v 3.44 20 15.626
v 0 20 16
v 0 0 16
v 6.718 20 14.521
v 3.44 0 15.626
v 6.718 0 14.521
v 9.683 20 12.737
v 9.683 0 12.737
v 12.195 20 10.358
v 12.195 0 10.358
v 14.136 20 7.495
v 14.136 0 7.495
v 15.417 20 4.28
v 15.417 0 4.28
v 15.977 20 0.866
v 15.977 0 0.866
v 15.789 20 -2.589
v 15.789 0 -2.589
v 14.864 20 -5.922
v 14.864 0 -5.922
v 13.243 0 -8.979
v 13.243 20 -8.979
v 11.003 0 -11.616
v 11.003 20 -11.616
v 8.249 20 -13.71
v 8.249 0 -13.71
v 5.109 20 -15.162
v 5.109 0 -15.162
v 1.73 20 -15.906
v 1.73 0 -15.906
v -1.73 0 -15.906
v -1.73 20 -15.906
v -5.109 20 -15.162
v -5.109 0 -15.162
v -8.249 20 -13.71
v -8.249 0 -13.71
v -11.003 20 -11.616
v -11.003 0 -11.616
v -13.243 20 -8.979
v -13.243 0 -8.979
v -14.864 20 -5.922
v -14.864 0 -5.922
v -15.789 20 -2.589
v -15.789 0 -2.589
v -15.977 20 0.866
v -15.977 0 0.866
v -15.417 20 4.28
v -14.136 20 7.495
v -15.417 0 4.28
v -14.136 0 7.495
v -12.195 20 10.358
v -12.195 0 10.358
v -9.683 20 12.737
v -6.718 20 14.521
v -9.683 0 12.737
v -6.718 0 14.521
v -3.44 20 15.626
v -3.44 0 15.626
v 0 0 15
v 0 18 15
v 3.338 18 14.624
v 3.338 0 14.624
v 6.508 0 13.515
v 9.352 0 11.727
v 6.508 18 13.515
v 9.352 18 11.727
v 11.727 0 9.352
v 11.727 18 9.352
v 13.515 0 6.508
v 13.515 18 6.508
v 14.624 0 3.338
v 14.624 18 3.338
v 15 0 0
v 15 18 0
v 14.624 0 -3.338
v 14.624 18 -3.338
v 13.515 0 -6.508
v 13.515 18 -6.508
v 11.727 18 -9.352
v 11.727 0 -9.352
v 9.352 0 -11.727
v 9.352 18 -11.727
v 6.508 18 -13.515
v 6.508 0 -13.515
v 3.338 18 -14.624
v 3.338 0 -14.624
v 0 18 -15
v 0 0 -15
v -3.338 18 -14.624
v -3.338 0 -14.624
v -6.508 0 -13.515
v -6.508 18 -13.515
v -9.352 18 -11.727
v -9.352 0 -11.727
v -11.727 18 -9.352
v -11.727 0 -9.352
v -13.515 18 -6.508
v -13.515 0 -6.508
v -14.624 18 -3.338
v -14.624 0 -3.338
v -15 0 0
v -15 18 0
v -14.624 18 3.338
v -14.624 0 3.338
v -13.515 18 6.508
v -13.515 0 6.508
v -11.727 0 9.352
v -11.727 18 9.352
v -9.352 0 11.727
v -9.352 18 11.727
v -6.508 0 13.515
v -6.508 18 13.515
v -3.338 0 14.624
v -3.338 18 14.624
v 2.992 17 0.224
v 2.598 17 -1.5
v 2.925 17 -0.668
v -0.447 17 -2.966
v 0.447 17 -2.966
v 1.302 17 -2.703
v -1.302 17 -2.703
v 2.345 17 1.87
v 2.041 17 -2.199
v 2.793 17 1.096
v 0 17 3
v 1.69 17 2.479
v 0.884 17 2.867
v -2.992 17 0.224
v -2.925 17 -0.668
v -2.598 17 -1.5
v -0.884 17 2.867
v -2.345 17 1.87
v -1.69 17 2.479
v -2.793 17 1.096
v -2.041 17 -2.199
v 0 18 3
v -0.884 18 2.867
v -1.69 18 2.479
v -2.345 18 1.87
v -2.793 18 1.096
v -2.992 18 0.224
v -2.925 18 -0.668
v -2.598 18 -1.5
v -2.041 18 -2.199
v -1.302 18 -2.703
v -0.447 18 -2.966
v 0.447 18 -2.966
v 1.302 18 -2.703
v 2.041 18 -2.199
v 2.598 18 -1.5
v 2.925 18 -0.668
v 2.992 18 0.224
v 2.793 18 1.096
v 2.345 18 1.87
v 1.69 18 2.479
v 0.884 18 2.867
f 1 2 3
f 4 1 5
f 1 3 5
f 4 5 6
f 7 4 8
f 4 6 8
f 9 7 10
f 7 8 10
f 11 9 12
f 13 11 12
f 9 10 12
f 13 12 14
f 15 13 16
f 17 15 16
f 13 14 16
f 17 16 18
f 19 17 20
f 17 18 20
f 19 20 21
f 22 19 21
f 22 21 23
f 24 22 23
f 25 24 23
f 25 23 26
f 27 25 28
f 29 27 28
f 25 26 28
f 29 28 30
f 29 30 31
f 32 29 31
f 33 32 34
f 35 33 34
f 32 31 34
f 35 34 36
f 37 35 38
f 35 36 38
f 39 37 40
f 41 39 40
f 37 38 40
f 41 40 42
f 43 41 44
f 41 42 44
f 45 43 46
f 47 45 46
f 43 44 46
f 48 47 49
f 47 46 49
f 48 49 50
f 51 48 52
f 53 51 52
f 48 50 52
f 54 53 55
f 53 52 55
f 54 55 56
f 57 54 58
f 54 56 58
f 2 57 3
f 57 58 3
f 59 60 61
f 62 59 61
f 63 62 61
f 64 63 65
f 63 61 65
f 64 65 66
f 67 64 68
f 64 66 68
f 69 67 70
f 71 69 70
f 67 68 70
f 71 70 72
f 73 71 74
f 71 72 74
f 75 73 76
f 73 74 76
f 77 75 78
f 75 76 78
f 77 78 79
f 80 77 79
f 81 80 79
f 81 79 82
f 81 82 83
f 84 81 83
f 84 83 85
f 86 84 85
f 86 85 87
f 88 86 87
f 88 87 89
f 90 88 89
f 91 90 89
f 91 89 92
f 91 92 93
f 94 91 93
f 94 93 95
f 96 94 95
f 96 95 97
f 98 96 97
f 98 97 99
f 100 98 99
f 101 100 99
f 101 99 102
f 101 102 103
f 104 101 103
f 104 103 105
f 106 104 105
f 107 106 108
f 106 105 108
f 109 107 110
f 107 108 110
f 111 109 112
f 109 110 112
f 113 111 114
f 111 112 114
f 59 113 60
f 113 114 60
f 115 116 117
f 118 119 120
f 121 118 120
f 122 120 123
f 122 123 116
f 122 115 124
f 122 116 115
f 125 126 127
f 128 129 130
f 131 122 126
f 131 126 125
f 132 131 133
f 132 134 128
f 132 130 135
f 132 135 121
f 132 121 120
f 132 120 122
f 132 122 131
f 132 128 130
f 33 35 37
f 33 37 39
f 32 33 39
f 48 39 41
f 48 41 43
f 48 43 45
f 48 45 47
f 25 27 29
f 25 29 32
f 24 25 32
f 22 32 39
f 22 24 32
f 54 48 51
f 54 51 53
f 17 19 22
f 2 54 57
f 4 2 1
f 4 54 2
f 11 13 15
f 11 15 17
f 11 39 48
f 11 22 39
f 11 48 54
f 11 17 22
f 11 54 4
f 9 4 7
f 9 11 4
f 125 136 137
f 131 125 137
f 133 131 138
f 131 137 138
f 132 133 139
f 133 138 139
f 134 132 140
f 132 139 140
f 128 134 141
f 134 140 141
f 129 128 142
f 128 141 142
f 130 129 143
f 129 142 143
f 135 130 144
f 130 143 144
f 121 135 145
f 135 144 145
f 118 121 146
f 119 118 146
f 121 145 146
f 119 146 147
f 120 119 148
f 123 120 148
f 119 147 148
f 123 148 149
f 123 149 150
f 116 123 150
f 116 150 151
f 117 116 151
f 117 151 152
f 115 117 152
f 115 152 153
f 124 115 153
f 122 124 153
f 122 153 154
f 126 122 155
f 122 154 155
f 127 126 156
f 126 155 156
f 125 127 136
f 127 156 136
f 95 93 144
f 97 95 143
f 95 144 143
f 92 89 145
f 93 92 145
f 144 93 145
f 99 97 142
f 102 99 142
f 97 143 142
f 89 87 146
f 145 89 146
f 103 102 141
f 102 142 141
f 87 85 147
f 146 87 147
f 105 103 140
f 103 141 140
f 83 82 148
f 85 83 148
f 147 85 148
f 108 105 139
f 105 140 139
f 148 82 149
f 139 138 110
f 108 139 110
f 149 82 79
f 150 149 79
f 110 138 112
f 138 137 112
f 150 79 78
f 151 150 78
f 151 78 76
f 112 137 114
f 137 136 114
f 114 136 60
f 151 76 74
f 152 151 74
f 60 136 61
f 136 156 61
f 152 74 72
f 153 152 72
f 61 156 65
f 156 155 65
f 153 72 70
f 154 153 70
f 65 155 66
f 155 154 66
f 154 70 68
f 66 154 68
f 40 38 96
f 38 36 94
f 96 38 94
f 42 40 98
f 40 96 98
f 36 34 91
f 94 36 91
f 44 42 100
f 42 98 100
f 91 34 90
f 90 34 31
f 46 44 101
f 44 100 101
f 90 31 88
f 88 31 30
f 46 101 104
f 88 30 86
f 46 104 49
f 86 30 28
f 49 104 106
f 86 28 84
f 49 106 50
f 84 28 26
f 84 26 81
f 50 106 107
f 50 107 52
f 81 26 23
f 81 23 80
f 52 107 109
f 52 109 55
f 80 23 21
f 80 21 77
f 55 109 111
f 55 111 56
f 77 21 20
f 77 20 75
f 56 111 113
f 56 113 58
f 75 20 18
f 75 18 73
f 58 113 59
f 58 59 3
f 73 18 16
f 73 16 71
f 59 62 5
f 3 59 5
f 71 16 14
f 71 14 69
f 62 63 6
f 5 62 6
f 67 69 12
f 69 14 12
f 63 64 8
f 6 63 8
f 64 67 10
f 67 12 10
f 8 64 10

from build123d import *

# Parameters (mm, degrees)
SKETCH2_R           = 16
BOSS_EXTRUDE1_DEPTH = 20
CUT_EXTRUDE1_START  = -2
SKETCH3_R           = 15
CUT_EXTRUDE1_DEPTH  = 29.199337741
SKETCH4_R           = 3
BOSS_EXTRUDE2_DEPTH = 1


with BuildPart() as part:
    # Sketch2 → Boss-Extrude1 (new body)
    with BuildSketch(Plane(origin=(0, 0, 0), x_dir=(1, 0, 0), z_dir=(0, 1, 0))):
        with Locations(Location((0, 0, 0), (0, 0, 270))):
            Circle(SKETCH2_R)
    extrude(amount=BOSS_EXTRUDE1_DEPTH)

    # Sketch3 → Cut-Extrude1 (cut, through all)
    with BuildSketch(Plane(origin=(0, 20, 0), x_dir=(1, 0, 0), z_dir=(0, 1, 0)).offset(CUT_EXTRUDE1_START)):
        with Locations(Location((0, 0, 0), (0, 0, 270))):
            Circle(SKETCH3_R)
    extrude(amount=-CUT_EXTRUDE1_DEPTH, mode=Mode.SUBTRACT)

    # Sketch4 → Boss-Extrude2 (add)
    with BuildSketch(Plane(origin=(0, 18, 0), x_dir=(-1, 0, 0), z_dir=(0, -1, 0))):
        with Locations(Location((0, 0, 0), (0, 0, 270))):
            Circle(SKETCH4_R)
    extrude(amount=BOSS_EXTRUDE2_DEPTH)


solid = part.part
